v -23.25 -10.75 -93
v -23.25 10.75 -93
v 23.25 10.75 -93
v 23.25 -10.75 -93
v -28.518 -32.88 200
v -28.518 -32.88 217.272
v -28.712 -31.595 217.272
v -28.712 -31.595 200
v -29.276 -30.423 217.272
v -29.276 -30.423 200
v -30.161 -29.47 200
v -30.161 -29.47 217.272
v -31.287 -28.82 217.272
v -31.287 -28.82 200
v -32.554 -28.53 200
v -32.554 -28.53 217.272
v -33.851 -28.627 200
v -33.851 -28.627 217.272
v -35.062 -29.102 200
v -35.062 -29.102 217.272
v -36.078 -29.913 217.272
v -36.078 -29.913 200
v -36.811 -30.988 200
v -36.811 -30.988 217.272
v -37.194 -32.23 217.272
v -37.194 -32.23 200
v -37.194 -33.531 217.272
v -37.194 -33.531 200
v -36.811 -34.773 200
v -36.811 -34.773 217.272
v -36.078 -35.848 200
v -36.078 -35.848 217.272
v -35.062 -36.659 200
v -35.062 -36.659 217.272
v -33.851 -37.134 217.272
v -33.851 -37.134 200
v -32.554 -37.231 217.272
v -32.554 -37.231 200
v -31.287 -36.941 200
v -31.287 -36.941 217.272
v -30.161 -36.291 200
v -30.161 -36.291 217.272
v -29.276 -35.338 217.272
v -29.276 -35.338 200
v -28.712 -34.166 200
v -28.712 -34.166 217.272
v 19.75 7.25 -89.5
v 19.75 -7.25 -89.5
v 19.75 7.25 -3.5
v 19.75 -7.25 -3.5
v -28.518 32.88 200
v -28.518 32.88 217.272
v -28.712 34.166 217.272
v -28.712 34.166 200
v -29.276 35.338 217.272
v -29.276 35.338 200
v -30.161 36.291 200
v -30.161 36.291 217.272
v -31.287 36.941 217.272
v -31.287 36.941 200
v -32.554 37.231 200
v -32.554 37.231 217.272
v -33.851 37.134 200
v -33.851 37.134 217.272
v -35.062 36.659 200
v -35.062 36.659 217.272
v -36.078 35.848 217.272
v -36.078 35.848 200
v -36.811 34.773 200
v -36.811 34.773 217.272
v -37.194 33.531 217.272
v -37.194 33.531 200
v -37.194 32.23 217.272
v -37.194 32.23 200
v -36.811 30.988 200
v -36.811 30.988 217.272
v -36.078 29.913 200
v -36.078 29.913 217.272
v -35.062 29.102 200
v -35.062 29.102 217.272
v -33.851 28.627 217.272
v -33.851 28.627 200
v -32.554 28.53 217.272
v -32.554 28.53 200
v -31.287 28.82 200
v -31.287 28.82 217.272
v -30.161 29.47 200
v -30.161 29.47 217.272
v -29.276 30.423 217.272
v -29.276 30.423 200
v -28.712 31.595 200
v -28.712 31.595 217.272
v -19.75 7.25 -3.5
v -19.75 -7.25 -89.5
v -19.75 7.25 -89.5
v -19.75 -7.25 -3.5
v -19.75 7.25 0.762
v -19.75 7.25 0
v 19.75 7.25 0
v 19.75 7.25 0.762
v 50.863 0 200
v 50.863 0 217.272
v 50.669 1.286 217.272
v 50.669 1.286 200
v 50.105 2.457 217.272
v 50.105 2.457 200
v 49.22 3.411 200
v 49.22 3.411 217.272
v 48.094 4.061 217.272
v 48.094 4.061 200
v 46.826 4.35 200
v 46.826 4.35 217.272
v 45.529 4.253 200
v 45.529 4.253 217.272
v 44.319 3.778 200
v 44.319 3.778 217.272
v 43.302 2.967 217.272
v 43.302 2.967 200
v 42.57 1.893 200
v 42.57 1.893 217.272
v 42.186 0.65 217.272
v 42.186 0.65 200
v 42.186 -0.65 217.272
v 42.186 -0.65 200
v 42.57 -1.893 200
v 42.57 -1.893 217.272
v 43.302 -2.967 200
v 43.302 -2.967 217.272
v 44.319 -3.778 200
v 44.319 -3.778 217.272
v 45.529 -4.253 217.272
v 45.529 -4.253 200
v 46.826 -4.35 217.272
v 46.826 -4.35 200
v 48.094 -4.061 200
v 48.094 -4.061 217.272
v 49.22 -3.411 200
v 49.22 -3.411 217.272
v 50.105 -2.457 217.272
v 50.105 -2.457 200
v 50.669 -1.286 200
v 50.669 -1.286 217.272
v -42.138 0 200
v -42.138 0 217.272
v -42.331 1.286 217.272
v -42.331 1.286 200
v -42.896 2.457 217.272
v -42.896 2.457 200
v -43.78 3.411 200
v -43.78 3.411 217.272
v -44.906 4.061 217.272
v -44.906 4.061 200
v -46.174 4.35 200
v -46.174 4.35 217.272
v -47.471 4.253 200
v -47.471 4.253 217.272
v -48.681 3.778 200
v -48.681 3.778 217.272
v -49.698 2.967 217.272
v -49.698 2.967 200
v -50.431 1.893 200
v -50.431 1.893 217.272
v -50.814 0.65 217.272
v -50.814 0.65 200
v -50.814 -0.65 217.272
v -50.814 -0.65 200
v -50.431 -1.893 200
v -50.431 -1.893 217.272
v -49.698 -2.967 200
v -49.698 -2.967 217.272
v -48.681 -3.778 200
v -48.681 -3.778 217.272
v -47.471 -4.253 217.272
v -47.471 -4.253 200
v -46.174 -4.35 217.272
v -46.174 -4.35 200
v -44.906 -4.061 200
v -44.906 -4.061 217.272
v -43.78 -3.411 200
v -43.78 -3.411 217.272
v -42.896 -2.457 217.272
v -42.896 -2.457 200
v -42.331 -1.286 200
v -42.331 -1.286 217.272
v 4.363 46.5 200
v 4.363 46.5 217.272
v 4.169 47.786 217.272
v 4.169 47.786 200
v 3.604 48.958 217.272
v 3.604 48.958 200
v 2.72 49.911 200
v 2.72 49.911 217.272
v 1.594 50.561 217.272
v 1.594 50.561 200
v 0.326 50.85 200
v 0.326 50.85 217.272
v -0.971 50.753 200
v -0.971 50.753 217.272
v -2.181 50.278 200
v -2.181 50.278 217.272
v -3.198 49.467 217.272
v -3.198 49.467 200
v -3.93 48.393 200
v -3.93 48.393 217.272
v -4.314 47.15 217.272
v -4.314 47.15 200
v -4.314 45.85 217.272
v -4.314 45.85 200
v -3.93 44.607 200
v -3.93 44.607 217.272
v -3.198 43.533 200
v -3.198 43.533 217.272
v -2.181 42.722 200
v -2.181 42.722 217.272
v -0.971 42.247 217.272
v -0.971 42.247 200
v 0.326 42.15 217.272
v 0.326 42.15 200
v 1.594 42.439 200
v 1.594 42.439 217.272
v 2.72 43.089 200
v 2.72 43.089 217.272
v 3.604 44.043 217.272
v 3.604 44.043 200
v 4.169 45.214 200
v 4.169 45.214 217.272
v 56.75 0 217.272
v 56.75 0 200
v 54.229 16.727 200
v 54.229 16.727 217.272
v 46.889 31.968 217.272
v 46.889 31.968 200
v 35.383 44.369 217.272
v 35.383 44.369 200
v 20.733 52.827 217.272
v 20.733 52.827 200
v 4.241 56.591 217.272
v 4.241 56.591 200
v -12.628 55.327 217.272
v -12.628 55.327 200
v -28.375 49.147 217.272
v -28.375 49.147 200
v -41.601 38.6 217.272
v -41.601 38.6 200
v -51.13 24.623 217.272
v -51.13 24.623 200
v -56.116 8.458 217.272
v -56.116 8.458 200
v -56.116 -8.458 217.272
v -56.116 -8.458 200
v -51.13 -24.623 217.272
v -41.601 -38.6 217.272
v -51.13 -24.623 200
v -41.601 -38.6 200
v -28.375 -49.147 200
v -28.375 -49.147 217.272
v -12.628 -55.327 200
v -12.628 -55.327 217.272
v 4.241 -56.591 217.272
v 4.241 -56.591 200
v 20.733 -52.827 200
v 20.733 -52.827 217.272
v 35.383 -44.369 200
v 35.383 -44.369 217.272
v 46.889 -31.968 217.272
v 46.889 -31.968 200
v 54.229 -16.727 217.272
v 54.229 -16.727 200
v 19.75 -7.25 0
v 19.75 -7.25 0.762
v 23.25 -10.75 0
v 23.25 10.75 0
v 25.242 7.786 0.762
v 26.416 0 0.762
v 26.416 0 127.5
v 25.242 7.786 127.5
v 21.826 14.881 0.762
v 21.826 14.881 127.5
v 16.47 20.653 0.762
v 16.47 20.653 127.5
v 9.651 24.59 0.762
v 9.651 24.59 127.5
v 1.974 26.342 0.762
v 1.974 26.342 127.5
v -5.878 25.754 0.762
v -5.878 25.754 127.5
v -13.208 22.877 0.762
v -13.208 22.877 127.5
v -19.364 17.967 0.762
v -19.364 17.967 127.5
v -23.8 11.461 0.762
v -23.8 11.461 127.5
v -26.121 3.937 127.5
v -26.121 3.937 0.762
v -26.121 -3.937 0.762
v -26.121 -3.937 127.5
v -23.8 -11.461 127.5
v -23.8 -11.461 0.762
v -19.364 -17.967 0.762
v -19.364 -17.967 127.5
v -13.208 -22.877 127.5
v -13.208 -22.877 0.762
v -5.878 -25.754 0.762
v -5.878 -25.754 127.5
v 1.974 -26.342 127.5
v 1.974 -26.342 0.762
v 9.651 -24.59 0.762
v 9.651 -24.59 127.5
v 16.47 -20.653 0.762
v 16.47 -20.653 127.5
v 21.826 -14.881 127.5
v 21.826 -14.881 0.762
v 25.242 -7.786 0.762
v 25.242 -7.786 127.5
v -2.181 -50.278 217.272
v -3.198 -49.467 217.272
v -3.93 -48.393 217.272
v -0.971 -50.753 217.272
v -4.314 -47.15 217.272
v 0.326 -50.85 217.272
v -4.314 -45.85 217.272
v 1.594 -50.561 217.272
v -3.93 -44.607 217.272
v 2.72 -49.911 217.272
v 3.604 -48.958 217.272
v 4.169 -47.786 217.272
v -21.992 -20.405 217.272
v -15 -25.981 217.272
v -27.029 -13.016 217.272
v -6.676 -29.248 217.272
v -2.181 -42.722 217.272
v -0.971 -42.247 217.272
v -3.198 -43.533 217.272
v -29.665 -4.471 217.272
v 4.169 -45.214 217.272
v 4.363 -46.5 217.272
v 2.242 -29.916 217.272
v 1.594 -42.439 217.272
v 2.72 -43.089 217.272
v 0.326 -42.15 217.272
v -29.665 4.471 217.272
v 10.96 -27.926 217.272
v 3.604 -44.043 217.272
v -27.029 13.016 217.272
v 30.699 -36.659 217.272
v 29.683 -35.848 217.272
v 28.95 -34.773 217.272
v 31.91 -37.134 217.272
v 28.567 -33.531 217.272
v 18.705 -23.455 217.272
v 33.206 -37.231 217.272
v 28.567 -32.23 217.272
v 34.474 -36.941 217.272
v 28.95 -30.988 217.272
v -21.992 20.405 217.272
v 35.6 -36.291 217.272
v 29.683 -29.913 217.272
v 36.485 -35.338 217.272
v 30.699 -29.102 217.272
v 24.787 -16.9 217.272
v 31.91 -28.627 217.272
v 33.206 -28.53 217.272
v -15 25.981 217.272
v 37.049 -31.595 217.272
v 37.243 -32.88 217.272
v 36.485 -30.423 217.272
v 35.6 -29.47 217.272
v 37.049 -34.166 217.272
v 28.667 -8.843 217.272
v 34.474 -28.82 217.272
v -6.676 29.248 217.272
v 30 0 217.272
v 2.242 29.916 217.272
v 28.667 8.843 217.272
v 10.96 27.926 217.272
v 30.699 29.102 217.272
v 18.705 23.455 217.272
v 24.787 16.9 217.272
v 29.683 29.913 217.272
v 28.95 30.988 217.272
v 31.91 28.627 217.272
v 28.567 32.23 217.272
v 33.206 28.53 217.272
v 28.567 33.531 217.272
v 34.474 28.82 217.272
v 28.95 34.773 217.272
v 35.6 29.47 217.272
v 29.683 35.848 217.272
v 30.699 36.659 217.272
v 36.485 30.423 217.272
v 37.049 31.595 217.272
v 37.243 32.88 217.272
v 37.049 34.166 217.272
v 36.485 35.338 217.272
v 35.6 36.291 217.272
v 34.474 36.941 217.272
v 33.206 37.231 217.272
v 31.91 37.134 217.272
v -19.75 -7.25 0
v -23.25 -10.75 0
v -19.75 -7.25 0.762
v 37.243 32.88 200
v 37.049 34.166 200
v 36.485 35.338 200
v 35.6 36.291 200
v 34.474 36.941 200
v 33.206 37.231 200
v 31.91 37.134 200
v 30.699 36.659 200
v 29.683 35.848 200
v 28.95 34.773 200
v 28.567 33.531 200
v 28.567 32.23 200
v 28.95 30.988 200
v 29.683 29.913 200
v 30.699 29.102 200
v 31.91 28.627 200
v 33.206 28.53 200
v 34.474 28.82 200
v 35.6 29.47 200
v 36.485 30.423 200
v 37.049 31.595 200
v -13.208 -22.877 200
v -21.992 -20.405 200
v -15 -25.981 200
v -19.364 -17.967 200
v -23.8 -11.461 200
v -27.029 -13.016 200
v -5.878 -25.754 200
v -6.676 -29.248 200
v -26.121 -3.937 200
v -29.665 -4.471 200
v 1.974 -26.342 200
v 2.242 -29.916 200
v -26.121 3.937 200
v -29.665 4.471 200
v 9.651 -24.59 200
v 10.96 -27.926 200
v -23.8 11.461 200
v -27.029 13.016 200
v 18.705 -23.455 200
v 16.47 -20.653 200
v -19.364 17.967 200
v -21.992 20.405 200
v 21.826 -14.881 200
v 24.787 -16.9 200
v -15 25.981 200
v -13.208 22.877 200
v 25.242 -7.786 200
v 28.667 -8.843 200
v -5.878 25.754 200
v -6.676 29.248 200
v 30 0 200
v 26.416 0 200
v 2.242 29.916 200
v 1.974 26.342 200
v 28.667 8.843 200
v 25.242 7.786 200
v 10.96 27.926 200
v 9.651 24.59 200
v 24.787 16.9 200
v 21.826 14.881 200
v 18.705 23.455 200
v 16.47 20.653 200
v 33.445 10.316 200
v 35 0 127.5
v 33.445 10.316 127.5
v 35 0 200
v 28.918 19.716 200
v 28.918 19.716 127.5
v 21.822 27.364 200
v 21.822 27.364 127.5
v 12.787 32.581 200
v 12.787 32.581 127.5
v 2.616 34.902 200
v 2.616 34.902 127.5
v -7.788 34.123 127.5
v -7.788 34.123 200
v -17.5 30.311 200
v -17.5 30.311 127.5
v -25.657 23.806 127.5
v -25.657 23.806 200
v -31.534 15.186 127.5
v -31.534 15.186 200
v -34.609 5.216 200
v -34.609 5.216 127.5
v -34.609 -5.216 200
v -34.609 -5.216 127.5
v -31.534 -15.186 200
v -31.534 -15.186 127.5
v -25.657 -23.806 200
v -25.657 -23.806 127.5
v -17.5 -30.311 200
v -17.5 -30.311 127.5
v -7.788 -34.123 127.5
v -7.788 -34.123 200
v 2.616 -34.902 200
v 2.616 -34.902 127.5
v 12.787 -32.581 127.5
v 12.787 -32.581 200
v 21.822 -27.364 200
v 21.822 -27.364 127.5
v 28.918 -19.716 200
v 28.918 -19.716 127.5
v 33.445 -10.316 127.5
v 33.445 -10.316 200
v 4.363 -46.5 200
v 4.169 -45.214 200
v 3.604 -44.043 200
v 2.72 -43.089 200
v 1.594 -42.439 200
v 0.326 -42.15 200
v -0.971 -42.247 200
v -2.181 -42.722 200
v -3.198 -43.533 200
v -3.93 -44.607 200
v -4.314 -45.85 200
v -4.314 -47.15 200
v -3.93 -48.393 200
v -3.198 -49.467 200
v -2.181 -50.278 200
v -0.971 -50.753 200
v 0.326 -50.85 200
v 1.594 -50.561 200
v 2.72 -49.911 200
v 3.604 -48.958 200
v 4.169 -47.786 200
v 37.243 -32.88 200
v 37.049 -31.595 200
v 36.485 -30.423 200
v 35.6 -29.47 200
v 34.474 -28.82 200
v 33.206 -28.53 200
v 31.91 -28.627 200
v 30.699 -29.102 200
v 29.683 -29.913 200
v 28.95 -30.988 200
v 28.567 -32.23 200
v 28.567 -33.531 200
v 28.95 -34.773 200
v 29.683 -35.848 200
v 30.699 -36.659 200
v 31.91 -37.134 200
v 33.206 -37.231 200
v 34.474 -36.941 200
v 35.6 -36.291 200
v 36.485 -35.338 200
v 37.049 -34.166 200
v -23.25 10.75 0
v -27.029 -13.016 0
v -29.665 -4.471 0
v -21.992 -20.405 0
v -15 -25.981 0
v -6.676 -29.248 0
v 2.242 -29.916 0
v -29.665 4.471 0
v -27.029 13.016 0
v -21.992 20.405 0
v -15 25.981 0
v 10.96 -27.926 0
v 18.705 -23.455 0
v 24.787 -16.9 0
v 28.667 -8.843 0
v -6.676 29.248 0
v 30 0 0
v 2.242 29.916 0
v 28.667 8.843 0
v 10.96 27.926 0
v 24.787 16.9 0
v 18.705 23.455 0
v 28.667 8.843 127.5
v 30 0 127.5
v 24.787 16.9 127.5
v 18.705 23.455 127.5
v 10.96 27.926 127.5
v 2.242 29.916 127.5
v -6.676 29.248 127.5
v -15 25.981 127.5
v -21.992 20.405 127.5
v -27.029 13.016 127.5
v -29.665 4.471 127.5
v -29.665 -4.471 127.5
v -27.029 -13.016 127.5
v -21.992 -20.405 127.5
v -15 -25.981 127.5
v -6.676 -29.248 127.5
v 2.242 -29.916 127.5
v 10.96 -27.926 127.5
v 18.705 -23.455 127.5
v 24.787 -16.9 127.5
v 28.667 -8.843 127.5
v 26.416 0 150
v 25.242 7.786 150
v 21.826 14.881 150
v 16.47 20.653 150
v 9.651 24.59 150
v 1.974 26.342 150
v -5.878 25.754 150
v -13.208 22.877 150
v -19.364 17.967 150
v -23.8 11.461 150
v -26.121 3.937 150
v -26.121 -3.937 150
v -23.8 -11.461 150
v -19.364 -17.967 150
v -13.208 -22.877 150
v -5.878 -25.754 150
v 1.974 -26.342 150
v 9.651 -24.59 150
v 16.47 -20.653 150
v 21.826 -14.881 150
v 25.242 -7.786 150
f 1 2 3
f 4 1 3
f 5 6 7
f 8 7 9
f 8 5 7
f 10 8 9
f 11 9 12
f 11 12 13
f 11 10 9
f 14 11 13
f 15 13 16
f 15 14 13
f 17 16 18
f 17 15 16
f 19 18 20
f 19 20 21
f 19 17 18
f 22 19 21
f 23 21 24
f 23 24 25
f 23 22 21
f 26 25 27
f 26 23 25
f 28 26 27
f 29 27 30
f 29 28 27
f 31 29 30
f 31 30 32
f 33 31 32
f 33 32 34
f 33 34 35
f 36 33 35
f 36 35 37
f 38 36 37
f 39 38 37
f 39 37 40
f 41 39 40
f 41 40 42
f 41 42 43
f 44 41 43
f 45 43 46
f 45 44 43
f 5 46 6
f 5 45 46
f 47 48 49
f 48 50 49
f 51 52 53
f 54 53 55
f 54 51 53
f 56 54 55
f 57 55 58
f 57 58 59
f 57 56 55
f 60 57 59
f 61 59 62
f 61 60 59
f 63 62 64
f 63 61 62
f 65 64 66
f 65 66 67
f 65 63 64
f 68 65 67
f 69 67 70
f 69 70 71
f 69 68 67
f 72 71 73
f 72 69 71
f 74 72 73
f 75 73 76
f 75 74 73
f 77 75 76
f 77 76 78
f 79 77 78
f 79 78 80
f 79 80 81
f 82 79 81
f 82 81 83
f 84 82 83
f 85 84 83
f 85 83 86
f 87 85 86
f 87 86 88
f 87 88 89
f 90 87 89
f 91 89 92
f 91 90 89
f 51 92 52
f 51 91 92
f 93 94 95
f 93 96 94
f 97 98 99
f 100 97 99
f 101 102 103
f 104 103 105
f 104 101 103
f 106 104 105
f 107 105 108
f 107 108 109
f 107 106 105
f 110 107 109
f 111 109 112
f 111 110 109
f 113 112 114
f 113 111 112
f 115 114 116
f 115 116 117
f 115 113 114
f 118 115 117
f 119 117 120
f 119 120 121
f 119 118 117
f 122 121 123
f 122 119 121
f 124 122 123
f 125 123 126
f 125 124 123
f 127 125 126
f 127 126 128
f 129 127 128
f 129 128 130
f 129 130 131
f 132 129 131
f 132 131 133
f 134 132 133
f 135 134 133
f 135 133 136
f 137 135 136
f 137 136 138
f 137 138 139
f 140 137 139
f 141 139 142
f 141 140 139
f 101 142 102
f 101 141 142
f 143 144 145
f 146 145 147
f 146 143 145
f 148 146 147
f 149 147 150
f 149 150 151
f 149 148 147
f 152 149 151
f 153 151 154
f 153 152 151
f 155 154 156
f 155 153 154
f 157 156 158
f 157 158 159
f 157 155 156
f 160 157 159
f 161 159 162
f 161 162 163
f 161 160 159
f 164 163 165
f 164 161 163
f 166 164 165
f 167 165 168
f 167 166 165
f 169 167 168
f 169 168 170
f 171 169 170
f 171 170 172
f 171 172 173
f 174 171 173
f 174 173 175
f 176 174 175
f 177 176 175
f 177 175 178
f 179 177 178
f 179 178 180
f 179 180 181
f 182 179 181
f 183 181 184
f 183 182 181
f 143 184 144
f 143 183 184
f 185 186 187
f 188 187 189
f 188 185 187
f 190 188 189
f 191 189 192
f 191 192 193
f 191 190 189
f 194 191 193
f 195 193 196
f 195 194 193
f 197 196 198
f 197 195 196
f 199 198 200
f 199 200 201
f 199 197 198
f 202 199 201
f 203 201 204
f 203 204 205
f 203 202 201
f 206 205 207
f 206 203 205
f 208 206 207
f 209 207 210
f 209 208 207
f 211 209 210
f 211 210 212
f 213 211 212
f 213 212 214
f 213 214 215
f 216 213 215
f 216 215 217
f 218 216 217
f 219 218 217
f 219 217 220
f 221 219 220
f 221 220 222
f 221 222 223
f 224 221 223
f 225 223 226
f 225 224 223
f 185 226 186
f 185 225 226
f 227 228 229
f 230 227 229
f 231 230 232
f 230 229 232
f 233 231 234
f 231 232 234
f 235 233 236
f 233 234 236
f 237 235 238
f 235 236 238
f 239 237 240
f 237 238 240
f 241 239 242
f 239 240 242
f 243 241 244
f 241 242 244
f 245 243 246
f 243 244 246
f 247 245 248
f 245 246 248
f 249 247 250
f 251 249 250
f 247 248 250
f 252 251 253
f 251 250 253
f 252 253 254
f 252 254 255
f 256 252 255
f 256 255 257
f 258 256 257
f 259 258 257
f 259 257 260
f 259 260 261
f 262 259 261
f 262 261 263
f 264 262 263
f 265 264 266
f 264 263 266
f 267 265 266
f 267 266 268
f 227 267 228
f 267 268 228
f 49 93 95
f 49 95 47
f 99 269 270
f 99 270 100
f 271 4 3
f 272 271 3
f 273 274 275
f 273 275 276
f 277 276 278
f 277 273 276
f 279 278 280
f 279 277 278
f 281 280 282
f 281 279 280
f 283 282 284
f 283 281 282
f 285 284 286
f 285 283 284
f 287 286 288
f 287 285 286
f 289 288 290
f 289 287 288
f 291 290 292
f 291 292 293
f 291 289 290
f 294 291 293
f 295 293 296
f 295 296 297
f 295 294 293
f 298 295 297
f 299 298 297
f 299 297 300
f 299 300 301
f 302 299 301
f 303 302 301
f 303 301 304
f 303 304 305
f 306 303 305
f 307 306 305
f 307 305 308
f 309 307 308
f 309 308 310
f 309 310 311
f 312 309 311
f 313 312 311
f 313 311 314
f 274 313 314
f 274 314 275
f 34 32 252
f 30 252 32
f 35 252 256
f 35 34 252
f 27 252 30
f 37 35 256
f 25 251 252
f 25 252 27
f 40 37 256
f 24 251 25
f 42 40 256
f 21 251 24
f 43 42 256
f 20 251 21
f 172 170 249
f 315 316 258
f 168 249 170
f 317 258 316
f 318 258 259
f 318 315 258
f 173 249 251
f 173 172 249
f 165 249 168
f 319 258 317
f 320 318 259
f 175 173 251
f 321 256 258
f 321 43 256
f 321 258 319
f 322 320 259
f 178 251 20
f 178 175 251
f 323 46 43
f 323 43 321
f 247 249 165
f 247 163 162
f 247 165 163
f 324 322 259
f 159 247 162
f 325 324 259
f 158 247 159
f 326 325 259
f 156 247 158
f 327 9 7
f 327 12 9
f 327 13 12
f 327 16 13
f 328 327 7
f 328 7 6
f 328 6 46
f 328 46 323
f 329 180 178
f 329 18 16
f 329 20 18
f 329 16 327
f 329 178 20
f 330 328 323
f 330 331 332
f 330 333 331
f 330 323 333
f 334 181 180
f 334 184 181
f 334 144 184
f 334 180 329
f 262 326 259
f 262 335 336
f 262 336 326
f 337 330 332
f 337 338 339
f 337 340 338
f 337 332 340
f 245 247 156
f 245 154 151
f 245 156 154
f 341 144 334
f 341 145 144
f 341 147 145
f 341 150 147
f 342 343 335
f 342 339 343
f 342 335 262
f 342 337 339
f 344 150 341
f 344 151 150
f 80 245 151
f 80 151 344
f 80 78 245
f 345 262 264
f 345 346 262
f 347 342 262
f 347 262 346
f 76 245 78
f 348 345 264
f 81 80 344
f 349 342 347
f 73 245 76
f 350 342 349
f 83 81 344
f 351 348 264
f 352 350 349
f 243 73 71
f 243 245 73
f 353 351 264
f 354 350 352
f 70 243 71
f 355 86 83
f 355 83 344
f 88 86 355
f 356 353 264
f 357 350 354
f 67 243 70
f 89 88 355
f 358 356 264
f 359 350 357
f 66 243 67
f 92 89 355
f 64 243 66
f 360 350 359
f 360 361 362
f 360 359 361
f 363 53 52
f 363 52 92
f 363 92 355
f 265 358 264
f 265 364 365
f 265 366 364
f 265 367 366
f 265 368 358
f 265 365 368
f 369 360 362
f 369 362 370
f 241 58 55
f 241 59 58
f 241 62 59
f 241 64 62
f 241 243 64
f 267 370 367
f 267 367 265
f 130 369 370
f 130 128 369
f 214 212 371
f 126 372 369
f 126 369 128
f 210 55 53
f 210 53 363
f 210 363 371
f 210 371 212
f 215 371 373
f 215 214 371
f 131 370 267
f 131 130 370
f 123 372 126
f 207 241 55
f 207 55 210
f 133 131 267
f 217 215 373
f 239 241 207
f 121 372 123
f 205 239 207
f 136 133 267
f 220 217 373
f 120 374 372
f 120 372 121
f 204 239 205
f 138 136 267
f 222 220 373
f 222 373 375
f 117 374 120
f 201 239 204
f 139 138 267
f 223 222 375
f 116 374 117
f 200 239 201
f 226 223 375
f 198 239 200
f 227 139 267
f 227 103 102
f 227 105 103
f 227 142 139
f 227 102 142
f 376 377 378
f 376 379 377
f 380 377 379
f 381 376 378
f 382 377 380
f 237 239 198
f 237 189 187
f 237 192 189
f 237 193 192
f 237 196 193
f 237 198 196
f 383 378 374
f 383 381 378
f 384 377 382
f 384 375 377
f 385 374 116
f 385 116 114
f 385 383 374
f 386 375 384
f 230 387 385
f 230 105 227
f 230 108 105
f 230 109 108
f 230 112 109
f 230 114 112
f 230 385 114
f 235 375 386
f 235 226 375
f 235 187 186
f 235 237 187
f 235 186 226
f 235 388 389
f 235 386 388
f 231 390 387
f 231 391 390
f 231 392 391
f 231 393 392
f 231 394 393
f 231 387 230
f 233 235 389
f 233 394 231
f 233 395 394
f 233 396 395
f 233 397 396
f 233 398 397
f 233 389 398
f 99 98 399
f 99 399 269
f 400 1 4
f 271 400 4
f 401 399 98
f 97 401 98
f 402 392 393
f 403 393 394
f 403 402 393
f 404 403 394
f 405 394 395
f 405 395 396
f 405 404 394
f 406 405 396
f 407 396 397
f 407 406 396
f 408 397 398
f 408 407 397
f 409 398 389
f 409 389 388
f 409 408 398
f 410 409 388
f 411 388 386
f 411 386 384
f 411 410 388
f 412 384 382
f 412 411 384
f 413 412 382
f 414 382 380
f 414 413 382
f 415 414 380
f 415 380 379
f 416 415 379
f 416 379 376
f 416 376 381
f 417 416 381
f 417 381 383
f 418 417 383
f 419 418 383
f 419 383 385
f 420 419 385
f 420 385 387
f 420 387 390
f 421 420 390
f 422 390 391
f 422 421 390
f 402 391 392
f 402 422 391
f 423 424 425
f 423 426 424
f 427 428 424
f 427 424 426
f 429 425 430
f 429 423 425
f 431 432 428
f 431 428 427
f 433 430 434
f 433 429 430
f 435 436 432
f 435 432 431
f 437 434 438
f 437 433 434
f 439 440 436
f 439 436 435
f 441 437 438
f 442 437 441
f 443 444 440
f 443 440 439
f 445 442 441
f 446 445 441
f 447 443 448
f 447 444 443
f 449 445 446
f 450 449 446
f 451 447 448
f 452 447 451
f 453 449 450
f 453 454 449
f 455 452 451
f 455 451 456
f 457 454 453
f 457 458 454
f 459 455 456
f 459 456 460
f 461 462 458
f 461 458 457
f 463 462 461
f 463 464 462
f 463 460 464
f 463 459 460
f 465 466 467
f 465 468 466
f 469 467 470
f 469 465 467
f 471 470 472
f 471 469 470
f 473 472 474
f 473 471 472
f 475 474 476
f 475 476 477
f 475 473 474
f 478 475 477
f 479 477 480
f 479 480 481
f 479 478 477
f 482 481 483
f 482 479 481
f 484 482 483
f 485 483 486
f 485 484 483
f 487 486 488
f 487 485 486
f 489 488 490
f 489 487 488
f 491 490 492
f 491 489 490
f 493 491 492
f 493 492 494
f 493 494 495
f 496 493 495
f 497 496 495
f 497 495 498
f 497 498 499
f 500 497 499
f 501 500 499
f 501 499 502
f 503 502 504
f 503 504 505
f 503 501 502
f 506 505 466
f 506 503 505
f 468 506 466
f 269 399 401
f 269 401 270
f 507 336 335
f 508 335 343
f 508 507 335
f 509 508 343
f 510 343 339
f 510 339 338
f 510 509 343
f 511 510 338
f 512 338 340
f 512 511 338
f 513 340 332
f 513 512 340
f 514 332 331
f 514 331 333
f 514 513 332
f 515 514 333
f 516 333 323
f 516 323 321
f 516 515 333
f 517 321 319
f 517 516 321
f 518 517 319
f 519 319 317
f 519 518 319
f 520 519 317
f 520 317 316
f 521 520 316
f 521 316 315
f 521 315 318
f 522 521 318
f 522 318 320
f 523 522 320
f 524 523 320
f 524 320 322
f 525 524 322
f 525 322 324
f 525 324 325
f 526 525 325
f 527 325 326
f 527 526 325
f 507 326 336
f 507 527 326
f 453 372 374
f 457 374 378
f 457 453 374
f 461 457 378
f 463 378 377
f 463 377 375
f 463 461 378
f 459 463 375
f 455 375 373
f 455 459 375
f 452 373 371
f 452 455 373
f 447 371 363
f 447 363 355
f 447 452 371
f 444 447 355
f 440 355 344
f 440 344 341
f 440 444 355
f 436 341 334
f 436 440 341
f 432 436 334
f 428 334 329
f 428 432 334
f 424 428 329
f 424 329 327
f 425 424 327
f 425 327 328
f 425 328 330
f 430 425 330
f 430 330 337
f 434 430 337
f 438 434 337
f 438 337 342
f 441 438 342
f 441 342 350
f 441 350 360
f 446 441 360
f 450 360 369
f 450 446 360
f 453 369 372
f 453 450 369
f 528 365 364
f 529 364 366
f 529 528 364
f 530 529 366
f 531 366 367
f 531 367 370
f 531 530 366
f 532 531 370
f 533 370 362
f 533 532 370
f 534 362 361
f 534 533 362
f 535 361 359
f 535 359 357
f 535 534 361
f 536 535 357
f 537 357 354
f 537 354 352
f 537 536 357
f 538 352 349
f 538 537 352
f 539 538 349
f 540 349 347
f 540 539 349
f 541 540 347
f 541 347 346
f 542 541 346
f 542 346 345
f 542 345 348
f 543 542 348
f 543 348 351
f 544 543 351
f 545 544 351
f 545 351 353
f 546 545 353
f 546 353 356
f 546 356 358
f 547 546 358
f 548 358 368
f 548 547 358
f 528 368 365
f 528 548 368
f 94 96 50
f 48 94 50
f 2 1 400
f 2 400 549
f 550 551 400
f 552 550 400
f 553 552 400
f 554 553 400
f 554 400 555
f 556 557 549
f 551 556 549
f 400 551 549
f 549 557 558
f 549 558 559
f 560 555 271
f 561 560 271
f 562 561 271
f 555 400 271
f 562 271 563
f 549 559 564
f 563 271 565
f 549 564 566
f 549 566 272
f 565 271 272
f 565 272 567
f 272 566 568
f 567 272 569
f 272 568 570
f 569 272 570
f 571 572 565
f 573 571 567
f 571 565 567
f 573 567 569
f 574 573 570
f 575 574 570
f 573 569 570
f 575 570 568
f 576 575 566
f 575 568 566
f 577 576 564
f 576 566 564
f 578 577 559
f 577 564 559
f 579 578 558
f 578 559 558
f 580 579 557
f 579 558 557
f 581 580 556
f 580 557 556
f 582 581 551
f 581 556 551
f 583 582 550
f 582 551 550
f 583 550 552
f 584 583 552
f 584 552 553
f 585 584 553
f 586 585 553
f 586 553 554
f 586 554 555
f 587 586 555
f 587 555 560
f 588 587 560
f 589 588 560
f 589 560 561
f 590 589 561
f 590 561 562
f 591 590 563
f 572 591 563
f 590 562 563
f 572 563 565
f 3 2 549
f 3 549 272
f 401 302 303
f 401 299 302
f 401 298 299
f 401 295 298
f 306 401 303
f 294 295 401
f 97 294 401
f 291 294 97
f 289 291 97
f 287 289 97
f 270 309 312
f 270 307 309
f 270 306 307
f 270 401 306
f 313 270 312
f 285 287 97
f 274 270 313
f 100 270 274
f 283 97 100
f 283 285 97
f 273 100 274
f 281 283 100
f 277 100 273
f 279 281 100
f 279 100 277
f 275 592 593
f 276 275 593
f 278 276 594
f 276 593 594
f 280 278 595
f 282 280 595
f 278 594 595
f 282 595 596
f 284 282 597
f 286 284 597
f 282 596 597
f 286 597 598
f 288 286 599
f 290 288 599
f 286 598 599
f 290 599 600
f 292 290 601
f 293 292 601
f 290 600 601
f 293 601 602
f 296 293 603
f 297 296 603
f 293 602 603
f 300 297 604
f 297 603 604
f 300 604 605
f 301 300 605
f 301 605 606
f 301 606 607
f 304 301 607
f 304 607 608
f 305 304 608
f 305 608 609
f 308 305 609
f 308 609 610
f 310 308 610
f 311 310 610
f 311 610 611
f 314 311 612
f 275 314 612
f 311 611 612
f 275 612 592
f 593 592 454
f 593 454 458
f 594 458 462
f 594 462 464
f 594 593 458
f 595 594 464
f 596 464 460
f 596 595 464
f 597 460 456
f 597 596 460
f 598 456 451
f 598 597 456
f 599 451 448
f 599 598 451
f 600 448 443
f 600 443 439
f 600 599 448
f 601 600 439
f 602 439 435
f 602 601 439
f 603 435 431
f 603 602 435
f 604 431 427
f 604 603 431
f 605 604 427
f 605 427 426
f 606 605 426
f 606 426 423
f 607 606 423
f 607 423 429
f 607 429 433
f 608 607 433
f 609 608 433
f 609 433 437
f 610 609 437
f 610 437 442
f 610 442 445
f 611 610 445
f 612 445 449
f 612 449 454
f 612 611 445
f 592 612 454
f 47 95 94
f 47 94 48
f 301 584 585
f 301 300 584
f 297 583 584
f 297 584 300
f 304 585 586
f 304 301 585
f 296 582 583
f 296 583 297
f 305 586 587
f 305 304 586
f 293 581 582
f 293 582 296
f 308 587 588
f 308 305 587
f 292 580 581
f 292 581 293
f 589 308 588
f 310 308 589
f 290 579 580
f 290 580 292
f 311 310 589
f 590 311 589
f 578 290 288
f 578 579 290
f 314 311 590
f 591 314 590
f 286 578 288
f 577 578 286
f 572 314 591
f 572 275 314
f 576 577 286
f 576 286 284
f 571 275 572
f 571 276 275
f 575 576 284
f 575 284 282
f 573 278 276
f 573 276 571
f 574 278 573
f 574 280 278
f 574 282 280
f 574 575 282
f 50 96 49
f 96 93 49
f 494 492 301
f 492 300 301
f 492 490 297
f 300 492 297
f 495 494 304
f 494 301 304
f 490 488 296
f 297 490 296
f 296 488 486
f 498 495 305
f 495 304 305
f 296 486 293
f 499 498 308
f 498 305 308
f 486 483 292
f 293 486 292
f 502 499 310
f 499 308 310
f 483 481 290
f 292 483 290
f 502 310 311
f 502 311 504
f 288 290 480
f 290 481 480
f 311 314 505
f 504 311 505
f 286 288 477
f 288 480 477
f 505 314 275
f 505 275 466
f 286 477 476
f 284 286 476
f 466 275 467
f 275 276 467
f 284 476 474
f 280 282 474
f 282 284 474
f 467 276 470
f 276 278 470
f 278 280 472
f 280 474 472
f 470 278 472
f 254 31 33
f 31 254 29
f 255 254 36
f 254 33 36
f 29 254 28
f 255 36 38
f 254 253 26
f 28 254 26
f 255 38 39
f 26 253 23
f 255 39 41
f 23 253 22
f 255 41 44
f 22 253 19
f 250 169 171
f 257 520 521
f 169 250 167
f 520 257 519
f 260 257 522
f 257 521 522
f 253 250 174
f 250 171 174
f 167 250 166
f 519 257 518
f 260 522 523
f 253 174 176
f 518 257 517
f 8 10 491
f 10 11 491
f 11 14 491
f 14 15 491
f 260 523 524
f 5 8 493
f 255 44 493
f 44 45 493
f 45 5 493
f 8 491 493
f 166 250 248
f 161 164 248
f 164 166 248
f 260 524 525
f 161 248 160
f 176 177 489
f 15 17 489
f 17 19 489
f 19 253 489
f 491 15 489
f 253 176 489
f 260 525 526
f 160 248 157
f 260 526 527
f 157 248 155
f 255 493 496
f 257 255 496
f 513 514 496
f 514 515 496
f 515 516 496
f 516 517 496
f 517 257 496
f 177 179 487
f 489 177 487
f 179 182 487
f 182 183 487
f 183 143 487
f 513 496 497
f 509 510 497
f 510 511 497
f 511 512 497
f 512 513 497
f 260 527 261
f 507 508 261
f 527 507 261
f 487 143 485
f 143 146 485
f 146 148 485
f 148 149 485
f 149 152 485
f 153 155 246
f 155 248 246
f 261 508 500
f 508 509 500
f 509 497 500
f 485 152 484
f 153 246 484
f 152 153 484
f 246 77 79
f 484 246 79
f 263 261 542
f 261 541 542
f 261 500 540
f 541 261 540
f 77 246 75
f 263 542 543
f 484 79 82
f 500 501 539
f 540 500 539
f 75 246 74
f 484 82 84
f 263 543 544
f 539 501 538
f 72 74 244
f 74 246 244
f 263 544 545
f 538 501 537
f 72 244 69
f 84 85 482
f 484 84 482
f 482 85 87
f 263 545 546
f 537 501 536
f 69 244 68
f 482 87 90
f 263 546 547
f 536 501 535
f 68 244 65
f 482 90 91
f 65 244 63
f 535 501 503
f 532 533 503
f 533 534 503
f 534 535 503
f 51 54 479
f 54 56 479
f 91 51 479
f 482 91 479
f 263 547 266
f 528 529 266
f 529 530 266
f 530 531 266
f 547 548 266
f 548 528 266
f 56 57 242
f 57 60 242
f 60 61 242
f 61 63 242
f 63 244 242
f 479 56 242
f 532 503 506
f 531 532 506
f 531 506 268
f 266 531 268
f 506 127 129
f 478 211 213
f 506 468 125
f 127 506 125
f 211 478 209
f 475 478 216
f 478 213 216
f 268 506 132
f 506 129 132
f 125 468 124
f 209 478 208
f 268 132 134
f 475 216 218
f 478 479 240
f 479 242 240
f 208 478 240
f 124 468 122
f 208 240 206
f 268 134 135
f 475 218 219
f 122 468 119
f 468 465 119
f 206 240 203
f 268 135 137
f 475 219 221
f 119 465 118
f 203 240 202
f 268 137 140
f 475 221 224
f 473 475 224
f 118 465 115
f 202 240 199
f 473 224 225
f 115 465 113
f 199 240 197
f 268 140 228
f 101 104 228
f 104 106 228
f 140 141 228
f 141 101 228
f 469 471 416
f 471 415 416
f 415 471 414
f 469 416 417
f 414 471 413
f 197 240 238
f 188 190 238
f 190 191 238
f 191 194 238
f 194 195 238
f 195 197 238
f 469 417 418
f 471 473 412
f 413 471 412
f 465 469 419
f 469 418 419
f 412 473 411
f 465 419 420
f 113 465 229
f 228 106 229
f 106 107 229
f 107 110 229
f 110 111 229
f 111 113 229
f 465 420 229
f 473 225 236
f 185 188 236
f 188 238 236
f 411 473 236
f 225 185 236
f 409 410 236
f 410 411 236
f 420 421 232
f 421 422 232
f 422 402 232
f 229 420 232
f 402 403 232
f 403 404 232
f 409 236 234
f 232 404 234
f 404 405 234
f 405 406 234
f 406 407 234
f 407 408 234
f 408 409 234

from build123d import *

# Parameters (mm, degrees)
SKETCH1_W           = 46.5000086
SKETCH1_H           = 21.50000018
BOSS_EXTRUDE1_DEPTH = 93.000068
SHELL1_T            = 3.499993
SKETCH2_R           = 29.99994
SKETCH2_R_2         = 26.416
BOSS_EXTRUDE2_DEPTH = 127.4998212
SKETCH18_R          = 56.74999953
SKETCH18_R_2        = 4.362500979
SKETCH18_R_3        = 29.99994
BOSS_EXTRUDE6_DEPTH = 17.272
SKETCH14_R          = 35.000057
SKETCH14_R_2        = 26.416
BOSS_EXTRUDE7_DEPTH = 49.9999508
SKETCH14_6_R        = 35.000057
SKETCH14_6_R_2      = 26.416
BOSS_EXTRUDE8_DEPTH = 22.50000072
SKETCH19_R          = 27.499945
SKETCH19_W          = 39.5000226
SKETCH19_H          = 14.50001418
BOSS_EXTRUDE9_DEPTH = 0.762


with BuildPart() as part:
    # Sketch1 → Boss-Extrude1 (new body)
    with BuildSketch(Plane.XY):
        Rectangle(SKETCH1_W, SKETCH1_H)
    extrude(amount=-BOSS_EXTRUDE1_DEPTH)

    # Shell1 (no face opened: a closed hollow body)
    add(offset(amount=-SHELL1_T, mode=Mode.PRIVATE), mode=Mode.SUBTRACT)



with BuildPart() as body_2:
    # Sketch2 → Boss-Extrude2 (new body)
    with BuildSketch(Plane.XY):
        Circle(SKETCH2_R)
        Circle(SKETCH2_R_2, mode=Mode.SUBTRACT)
    extrude(amount=BOSS_EXTRUDE2_DEPTH)


with BuildPart() as body_3:
    # Sketch18 → Boss-Extrude6 (new body)
    with BuildSketch(Plane.XY.offset(199.99977272)):
        Circle(SKETCH18_R)
        with Locations((0, 46.500034)):
            Circle(SKETCH18_R_2, mode=Mode.SUBTRACT)
        with Locations((32.880489367, 32.880489367)):
            Circle(SKETCH18_R_2, mode=Mode.SUBTRACT)
        with Locations((46.500034, 0)):
            Circle(SKETCH18_R_2, mode=Mode.SUBTRACT)
        with Locations((32.880489367, -32.880489367)):
            Circle(SKETCH18_R_2, mode=Mode.SUBTRACT)
        with Locations((0, -46.500034)):
            Circle(SKETCH18_R_2, mode=Mode.SUBTRACT)
        with Locations((-32.880489367, -32.880489367)):
            Circle(SKETCH18_R_2, mode=Mode.SUBTRACT)
        with Locations((-46.500034, 0)):
            Circle(SKETCH18_R_2, mode=Mode.SUBTRACT)
        with Locations((-32.880489367, 32.880489367)):
            Circle(SKETCH18_R_2, mode=Mode.SUBTRACT)
        Circle(SKETCH18_R_3, mode=Mode.SUBTRACT)
    extrude(amount=BOSS_EXTRUDE6_DEPTH)

    # Sketch14 → Boss-Extrude7 (add)
    with BuildSketch(Plane.XY.offset(149.99982192)):
        Circle(SKETCH14_R)
        Circle(SKETCH14_R_2, mode=Mode.SUBTRACT)
    extrude(amount=BOSS_EXTRUDE7_DEPTH)

    # Sketch14<6> → Boss-Extrude8 (add)
    with BuildSketch(Plane.XY.offset(149.99982192)):
        Circle(SKETCH14_6_R)
        Circle(SKETCH14_6_R_2, mode=Mode.SUBTRACT)
    extrude(amount=-BOSS_EXTRUDE8_DEPTH)


with BuildPart() as part_1:
    add(part.part)

    add(body_2.part)  # Boss-Extrude9 merges body 2
    # Sketch19 → Boss-Extrude9 (add)
    with BuildSketch(Plane.XY):
        Circle(SKETCH19_R)
        Rectangle(SKETCH19_W, SKETCH19_H, mode=Mode.SUBTRACT)
    extrude(amount=BOSS_EXTRUDE9_DEPTH)


solid = Compound([body_3.part, part_1.part])
